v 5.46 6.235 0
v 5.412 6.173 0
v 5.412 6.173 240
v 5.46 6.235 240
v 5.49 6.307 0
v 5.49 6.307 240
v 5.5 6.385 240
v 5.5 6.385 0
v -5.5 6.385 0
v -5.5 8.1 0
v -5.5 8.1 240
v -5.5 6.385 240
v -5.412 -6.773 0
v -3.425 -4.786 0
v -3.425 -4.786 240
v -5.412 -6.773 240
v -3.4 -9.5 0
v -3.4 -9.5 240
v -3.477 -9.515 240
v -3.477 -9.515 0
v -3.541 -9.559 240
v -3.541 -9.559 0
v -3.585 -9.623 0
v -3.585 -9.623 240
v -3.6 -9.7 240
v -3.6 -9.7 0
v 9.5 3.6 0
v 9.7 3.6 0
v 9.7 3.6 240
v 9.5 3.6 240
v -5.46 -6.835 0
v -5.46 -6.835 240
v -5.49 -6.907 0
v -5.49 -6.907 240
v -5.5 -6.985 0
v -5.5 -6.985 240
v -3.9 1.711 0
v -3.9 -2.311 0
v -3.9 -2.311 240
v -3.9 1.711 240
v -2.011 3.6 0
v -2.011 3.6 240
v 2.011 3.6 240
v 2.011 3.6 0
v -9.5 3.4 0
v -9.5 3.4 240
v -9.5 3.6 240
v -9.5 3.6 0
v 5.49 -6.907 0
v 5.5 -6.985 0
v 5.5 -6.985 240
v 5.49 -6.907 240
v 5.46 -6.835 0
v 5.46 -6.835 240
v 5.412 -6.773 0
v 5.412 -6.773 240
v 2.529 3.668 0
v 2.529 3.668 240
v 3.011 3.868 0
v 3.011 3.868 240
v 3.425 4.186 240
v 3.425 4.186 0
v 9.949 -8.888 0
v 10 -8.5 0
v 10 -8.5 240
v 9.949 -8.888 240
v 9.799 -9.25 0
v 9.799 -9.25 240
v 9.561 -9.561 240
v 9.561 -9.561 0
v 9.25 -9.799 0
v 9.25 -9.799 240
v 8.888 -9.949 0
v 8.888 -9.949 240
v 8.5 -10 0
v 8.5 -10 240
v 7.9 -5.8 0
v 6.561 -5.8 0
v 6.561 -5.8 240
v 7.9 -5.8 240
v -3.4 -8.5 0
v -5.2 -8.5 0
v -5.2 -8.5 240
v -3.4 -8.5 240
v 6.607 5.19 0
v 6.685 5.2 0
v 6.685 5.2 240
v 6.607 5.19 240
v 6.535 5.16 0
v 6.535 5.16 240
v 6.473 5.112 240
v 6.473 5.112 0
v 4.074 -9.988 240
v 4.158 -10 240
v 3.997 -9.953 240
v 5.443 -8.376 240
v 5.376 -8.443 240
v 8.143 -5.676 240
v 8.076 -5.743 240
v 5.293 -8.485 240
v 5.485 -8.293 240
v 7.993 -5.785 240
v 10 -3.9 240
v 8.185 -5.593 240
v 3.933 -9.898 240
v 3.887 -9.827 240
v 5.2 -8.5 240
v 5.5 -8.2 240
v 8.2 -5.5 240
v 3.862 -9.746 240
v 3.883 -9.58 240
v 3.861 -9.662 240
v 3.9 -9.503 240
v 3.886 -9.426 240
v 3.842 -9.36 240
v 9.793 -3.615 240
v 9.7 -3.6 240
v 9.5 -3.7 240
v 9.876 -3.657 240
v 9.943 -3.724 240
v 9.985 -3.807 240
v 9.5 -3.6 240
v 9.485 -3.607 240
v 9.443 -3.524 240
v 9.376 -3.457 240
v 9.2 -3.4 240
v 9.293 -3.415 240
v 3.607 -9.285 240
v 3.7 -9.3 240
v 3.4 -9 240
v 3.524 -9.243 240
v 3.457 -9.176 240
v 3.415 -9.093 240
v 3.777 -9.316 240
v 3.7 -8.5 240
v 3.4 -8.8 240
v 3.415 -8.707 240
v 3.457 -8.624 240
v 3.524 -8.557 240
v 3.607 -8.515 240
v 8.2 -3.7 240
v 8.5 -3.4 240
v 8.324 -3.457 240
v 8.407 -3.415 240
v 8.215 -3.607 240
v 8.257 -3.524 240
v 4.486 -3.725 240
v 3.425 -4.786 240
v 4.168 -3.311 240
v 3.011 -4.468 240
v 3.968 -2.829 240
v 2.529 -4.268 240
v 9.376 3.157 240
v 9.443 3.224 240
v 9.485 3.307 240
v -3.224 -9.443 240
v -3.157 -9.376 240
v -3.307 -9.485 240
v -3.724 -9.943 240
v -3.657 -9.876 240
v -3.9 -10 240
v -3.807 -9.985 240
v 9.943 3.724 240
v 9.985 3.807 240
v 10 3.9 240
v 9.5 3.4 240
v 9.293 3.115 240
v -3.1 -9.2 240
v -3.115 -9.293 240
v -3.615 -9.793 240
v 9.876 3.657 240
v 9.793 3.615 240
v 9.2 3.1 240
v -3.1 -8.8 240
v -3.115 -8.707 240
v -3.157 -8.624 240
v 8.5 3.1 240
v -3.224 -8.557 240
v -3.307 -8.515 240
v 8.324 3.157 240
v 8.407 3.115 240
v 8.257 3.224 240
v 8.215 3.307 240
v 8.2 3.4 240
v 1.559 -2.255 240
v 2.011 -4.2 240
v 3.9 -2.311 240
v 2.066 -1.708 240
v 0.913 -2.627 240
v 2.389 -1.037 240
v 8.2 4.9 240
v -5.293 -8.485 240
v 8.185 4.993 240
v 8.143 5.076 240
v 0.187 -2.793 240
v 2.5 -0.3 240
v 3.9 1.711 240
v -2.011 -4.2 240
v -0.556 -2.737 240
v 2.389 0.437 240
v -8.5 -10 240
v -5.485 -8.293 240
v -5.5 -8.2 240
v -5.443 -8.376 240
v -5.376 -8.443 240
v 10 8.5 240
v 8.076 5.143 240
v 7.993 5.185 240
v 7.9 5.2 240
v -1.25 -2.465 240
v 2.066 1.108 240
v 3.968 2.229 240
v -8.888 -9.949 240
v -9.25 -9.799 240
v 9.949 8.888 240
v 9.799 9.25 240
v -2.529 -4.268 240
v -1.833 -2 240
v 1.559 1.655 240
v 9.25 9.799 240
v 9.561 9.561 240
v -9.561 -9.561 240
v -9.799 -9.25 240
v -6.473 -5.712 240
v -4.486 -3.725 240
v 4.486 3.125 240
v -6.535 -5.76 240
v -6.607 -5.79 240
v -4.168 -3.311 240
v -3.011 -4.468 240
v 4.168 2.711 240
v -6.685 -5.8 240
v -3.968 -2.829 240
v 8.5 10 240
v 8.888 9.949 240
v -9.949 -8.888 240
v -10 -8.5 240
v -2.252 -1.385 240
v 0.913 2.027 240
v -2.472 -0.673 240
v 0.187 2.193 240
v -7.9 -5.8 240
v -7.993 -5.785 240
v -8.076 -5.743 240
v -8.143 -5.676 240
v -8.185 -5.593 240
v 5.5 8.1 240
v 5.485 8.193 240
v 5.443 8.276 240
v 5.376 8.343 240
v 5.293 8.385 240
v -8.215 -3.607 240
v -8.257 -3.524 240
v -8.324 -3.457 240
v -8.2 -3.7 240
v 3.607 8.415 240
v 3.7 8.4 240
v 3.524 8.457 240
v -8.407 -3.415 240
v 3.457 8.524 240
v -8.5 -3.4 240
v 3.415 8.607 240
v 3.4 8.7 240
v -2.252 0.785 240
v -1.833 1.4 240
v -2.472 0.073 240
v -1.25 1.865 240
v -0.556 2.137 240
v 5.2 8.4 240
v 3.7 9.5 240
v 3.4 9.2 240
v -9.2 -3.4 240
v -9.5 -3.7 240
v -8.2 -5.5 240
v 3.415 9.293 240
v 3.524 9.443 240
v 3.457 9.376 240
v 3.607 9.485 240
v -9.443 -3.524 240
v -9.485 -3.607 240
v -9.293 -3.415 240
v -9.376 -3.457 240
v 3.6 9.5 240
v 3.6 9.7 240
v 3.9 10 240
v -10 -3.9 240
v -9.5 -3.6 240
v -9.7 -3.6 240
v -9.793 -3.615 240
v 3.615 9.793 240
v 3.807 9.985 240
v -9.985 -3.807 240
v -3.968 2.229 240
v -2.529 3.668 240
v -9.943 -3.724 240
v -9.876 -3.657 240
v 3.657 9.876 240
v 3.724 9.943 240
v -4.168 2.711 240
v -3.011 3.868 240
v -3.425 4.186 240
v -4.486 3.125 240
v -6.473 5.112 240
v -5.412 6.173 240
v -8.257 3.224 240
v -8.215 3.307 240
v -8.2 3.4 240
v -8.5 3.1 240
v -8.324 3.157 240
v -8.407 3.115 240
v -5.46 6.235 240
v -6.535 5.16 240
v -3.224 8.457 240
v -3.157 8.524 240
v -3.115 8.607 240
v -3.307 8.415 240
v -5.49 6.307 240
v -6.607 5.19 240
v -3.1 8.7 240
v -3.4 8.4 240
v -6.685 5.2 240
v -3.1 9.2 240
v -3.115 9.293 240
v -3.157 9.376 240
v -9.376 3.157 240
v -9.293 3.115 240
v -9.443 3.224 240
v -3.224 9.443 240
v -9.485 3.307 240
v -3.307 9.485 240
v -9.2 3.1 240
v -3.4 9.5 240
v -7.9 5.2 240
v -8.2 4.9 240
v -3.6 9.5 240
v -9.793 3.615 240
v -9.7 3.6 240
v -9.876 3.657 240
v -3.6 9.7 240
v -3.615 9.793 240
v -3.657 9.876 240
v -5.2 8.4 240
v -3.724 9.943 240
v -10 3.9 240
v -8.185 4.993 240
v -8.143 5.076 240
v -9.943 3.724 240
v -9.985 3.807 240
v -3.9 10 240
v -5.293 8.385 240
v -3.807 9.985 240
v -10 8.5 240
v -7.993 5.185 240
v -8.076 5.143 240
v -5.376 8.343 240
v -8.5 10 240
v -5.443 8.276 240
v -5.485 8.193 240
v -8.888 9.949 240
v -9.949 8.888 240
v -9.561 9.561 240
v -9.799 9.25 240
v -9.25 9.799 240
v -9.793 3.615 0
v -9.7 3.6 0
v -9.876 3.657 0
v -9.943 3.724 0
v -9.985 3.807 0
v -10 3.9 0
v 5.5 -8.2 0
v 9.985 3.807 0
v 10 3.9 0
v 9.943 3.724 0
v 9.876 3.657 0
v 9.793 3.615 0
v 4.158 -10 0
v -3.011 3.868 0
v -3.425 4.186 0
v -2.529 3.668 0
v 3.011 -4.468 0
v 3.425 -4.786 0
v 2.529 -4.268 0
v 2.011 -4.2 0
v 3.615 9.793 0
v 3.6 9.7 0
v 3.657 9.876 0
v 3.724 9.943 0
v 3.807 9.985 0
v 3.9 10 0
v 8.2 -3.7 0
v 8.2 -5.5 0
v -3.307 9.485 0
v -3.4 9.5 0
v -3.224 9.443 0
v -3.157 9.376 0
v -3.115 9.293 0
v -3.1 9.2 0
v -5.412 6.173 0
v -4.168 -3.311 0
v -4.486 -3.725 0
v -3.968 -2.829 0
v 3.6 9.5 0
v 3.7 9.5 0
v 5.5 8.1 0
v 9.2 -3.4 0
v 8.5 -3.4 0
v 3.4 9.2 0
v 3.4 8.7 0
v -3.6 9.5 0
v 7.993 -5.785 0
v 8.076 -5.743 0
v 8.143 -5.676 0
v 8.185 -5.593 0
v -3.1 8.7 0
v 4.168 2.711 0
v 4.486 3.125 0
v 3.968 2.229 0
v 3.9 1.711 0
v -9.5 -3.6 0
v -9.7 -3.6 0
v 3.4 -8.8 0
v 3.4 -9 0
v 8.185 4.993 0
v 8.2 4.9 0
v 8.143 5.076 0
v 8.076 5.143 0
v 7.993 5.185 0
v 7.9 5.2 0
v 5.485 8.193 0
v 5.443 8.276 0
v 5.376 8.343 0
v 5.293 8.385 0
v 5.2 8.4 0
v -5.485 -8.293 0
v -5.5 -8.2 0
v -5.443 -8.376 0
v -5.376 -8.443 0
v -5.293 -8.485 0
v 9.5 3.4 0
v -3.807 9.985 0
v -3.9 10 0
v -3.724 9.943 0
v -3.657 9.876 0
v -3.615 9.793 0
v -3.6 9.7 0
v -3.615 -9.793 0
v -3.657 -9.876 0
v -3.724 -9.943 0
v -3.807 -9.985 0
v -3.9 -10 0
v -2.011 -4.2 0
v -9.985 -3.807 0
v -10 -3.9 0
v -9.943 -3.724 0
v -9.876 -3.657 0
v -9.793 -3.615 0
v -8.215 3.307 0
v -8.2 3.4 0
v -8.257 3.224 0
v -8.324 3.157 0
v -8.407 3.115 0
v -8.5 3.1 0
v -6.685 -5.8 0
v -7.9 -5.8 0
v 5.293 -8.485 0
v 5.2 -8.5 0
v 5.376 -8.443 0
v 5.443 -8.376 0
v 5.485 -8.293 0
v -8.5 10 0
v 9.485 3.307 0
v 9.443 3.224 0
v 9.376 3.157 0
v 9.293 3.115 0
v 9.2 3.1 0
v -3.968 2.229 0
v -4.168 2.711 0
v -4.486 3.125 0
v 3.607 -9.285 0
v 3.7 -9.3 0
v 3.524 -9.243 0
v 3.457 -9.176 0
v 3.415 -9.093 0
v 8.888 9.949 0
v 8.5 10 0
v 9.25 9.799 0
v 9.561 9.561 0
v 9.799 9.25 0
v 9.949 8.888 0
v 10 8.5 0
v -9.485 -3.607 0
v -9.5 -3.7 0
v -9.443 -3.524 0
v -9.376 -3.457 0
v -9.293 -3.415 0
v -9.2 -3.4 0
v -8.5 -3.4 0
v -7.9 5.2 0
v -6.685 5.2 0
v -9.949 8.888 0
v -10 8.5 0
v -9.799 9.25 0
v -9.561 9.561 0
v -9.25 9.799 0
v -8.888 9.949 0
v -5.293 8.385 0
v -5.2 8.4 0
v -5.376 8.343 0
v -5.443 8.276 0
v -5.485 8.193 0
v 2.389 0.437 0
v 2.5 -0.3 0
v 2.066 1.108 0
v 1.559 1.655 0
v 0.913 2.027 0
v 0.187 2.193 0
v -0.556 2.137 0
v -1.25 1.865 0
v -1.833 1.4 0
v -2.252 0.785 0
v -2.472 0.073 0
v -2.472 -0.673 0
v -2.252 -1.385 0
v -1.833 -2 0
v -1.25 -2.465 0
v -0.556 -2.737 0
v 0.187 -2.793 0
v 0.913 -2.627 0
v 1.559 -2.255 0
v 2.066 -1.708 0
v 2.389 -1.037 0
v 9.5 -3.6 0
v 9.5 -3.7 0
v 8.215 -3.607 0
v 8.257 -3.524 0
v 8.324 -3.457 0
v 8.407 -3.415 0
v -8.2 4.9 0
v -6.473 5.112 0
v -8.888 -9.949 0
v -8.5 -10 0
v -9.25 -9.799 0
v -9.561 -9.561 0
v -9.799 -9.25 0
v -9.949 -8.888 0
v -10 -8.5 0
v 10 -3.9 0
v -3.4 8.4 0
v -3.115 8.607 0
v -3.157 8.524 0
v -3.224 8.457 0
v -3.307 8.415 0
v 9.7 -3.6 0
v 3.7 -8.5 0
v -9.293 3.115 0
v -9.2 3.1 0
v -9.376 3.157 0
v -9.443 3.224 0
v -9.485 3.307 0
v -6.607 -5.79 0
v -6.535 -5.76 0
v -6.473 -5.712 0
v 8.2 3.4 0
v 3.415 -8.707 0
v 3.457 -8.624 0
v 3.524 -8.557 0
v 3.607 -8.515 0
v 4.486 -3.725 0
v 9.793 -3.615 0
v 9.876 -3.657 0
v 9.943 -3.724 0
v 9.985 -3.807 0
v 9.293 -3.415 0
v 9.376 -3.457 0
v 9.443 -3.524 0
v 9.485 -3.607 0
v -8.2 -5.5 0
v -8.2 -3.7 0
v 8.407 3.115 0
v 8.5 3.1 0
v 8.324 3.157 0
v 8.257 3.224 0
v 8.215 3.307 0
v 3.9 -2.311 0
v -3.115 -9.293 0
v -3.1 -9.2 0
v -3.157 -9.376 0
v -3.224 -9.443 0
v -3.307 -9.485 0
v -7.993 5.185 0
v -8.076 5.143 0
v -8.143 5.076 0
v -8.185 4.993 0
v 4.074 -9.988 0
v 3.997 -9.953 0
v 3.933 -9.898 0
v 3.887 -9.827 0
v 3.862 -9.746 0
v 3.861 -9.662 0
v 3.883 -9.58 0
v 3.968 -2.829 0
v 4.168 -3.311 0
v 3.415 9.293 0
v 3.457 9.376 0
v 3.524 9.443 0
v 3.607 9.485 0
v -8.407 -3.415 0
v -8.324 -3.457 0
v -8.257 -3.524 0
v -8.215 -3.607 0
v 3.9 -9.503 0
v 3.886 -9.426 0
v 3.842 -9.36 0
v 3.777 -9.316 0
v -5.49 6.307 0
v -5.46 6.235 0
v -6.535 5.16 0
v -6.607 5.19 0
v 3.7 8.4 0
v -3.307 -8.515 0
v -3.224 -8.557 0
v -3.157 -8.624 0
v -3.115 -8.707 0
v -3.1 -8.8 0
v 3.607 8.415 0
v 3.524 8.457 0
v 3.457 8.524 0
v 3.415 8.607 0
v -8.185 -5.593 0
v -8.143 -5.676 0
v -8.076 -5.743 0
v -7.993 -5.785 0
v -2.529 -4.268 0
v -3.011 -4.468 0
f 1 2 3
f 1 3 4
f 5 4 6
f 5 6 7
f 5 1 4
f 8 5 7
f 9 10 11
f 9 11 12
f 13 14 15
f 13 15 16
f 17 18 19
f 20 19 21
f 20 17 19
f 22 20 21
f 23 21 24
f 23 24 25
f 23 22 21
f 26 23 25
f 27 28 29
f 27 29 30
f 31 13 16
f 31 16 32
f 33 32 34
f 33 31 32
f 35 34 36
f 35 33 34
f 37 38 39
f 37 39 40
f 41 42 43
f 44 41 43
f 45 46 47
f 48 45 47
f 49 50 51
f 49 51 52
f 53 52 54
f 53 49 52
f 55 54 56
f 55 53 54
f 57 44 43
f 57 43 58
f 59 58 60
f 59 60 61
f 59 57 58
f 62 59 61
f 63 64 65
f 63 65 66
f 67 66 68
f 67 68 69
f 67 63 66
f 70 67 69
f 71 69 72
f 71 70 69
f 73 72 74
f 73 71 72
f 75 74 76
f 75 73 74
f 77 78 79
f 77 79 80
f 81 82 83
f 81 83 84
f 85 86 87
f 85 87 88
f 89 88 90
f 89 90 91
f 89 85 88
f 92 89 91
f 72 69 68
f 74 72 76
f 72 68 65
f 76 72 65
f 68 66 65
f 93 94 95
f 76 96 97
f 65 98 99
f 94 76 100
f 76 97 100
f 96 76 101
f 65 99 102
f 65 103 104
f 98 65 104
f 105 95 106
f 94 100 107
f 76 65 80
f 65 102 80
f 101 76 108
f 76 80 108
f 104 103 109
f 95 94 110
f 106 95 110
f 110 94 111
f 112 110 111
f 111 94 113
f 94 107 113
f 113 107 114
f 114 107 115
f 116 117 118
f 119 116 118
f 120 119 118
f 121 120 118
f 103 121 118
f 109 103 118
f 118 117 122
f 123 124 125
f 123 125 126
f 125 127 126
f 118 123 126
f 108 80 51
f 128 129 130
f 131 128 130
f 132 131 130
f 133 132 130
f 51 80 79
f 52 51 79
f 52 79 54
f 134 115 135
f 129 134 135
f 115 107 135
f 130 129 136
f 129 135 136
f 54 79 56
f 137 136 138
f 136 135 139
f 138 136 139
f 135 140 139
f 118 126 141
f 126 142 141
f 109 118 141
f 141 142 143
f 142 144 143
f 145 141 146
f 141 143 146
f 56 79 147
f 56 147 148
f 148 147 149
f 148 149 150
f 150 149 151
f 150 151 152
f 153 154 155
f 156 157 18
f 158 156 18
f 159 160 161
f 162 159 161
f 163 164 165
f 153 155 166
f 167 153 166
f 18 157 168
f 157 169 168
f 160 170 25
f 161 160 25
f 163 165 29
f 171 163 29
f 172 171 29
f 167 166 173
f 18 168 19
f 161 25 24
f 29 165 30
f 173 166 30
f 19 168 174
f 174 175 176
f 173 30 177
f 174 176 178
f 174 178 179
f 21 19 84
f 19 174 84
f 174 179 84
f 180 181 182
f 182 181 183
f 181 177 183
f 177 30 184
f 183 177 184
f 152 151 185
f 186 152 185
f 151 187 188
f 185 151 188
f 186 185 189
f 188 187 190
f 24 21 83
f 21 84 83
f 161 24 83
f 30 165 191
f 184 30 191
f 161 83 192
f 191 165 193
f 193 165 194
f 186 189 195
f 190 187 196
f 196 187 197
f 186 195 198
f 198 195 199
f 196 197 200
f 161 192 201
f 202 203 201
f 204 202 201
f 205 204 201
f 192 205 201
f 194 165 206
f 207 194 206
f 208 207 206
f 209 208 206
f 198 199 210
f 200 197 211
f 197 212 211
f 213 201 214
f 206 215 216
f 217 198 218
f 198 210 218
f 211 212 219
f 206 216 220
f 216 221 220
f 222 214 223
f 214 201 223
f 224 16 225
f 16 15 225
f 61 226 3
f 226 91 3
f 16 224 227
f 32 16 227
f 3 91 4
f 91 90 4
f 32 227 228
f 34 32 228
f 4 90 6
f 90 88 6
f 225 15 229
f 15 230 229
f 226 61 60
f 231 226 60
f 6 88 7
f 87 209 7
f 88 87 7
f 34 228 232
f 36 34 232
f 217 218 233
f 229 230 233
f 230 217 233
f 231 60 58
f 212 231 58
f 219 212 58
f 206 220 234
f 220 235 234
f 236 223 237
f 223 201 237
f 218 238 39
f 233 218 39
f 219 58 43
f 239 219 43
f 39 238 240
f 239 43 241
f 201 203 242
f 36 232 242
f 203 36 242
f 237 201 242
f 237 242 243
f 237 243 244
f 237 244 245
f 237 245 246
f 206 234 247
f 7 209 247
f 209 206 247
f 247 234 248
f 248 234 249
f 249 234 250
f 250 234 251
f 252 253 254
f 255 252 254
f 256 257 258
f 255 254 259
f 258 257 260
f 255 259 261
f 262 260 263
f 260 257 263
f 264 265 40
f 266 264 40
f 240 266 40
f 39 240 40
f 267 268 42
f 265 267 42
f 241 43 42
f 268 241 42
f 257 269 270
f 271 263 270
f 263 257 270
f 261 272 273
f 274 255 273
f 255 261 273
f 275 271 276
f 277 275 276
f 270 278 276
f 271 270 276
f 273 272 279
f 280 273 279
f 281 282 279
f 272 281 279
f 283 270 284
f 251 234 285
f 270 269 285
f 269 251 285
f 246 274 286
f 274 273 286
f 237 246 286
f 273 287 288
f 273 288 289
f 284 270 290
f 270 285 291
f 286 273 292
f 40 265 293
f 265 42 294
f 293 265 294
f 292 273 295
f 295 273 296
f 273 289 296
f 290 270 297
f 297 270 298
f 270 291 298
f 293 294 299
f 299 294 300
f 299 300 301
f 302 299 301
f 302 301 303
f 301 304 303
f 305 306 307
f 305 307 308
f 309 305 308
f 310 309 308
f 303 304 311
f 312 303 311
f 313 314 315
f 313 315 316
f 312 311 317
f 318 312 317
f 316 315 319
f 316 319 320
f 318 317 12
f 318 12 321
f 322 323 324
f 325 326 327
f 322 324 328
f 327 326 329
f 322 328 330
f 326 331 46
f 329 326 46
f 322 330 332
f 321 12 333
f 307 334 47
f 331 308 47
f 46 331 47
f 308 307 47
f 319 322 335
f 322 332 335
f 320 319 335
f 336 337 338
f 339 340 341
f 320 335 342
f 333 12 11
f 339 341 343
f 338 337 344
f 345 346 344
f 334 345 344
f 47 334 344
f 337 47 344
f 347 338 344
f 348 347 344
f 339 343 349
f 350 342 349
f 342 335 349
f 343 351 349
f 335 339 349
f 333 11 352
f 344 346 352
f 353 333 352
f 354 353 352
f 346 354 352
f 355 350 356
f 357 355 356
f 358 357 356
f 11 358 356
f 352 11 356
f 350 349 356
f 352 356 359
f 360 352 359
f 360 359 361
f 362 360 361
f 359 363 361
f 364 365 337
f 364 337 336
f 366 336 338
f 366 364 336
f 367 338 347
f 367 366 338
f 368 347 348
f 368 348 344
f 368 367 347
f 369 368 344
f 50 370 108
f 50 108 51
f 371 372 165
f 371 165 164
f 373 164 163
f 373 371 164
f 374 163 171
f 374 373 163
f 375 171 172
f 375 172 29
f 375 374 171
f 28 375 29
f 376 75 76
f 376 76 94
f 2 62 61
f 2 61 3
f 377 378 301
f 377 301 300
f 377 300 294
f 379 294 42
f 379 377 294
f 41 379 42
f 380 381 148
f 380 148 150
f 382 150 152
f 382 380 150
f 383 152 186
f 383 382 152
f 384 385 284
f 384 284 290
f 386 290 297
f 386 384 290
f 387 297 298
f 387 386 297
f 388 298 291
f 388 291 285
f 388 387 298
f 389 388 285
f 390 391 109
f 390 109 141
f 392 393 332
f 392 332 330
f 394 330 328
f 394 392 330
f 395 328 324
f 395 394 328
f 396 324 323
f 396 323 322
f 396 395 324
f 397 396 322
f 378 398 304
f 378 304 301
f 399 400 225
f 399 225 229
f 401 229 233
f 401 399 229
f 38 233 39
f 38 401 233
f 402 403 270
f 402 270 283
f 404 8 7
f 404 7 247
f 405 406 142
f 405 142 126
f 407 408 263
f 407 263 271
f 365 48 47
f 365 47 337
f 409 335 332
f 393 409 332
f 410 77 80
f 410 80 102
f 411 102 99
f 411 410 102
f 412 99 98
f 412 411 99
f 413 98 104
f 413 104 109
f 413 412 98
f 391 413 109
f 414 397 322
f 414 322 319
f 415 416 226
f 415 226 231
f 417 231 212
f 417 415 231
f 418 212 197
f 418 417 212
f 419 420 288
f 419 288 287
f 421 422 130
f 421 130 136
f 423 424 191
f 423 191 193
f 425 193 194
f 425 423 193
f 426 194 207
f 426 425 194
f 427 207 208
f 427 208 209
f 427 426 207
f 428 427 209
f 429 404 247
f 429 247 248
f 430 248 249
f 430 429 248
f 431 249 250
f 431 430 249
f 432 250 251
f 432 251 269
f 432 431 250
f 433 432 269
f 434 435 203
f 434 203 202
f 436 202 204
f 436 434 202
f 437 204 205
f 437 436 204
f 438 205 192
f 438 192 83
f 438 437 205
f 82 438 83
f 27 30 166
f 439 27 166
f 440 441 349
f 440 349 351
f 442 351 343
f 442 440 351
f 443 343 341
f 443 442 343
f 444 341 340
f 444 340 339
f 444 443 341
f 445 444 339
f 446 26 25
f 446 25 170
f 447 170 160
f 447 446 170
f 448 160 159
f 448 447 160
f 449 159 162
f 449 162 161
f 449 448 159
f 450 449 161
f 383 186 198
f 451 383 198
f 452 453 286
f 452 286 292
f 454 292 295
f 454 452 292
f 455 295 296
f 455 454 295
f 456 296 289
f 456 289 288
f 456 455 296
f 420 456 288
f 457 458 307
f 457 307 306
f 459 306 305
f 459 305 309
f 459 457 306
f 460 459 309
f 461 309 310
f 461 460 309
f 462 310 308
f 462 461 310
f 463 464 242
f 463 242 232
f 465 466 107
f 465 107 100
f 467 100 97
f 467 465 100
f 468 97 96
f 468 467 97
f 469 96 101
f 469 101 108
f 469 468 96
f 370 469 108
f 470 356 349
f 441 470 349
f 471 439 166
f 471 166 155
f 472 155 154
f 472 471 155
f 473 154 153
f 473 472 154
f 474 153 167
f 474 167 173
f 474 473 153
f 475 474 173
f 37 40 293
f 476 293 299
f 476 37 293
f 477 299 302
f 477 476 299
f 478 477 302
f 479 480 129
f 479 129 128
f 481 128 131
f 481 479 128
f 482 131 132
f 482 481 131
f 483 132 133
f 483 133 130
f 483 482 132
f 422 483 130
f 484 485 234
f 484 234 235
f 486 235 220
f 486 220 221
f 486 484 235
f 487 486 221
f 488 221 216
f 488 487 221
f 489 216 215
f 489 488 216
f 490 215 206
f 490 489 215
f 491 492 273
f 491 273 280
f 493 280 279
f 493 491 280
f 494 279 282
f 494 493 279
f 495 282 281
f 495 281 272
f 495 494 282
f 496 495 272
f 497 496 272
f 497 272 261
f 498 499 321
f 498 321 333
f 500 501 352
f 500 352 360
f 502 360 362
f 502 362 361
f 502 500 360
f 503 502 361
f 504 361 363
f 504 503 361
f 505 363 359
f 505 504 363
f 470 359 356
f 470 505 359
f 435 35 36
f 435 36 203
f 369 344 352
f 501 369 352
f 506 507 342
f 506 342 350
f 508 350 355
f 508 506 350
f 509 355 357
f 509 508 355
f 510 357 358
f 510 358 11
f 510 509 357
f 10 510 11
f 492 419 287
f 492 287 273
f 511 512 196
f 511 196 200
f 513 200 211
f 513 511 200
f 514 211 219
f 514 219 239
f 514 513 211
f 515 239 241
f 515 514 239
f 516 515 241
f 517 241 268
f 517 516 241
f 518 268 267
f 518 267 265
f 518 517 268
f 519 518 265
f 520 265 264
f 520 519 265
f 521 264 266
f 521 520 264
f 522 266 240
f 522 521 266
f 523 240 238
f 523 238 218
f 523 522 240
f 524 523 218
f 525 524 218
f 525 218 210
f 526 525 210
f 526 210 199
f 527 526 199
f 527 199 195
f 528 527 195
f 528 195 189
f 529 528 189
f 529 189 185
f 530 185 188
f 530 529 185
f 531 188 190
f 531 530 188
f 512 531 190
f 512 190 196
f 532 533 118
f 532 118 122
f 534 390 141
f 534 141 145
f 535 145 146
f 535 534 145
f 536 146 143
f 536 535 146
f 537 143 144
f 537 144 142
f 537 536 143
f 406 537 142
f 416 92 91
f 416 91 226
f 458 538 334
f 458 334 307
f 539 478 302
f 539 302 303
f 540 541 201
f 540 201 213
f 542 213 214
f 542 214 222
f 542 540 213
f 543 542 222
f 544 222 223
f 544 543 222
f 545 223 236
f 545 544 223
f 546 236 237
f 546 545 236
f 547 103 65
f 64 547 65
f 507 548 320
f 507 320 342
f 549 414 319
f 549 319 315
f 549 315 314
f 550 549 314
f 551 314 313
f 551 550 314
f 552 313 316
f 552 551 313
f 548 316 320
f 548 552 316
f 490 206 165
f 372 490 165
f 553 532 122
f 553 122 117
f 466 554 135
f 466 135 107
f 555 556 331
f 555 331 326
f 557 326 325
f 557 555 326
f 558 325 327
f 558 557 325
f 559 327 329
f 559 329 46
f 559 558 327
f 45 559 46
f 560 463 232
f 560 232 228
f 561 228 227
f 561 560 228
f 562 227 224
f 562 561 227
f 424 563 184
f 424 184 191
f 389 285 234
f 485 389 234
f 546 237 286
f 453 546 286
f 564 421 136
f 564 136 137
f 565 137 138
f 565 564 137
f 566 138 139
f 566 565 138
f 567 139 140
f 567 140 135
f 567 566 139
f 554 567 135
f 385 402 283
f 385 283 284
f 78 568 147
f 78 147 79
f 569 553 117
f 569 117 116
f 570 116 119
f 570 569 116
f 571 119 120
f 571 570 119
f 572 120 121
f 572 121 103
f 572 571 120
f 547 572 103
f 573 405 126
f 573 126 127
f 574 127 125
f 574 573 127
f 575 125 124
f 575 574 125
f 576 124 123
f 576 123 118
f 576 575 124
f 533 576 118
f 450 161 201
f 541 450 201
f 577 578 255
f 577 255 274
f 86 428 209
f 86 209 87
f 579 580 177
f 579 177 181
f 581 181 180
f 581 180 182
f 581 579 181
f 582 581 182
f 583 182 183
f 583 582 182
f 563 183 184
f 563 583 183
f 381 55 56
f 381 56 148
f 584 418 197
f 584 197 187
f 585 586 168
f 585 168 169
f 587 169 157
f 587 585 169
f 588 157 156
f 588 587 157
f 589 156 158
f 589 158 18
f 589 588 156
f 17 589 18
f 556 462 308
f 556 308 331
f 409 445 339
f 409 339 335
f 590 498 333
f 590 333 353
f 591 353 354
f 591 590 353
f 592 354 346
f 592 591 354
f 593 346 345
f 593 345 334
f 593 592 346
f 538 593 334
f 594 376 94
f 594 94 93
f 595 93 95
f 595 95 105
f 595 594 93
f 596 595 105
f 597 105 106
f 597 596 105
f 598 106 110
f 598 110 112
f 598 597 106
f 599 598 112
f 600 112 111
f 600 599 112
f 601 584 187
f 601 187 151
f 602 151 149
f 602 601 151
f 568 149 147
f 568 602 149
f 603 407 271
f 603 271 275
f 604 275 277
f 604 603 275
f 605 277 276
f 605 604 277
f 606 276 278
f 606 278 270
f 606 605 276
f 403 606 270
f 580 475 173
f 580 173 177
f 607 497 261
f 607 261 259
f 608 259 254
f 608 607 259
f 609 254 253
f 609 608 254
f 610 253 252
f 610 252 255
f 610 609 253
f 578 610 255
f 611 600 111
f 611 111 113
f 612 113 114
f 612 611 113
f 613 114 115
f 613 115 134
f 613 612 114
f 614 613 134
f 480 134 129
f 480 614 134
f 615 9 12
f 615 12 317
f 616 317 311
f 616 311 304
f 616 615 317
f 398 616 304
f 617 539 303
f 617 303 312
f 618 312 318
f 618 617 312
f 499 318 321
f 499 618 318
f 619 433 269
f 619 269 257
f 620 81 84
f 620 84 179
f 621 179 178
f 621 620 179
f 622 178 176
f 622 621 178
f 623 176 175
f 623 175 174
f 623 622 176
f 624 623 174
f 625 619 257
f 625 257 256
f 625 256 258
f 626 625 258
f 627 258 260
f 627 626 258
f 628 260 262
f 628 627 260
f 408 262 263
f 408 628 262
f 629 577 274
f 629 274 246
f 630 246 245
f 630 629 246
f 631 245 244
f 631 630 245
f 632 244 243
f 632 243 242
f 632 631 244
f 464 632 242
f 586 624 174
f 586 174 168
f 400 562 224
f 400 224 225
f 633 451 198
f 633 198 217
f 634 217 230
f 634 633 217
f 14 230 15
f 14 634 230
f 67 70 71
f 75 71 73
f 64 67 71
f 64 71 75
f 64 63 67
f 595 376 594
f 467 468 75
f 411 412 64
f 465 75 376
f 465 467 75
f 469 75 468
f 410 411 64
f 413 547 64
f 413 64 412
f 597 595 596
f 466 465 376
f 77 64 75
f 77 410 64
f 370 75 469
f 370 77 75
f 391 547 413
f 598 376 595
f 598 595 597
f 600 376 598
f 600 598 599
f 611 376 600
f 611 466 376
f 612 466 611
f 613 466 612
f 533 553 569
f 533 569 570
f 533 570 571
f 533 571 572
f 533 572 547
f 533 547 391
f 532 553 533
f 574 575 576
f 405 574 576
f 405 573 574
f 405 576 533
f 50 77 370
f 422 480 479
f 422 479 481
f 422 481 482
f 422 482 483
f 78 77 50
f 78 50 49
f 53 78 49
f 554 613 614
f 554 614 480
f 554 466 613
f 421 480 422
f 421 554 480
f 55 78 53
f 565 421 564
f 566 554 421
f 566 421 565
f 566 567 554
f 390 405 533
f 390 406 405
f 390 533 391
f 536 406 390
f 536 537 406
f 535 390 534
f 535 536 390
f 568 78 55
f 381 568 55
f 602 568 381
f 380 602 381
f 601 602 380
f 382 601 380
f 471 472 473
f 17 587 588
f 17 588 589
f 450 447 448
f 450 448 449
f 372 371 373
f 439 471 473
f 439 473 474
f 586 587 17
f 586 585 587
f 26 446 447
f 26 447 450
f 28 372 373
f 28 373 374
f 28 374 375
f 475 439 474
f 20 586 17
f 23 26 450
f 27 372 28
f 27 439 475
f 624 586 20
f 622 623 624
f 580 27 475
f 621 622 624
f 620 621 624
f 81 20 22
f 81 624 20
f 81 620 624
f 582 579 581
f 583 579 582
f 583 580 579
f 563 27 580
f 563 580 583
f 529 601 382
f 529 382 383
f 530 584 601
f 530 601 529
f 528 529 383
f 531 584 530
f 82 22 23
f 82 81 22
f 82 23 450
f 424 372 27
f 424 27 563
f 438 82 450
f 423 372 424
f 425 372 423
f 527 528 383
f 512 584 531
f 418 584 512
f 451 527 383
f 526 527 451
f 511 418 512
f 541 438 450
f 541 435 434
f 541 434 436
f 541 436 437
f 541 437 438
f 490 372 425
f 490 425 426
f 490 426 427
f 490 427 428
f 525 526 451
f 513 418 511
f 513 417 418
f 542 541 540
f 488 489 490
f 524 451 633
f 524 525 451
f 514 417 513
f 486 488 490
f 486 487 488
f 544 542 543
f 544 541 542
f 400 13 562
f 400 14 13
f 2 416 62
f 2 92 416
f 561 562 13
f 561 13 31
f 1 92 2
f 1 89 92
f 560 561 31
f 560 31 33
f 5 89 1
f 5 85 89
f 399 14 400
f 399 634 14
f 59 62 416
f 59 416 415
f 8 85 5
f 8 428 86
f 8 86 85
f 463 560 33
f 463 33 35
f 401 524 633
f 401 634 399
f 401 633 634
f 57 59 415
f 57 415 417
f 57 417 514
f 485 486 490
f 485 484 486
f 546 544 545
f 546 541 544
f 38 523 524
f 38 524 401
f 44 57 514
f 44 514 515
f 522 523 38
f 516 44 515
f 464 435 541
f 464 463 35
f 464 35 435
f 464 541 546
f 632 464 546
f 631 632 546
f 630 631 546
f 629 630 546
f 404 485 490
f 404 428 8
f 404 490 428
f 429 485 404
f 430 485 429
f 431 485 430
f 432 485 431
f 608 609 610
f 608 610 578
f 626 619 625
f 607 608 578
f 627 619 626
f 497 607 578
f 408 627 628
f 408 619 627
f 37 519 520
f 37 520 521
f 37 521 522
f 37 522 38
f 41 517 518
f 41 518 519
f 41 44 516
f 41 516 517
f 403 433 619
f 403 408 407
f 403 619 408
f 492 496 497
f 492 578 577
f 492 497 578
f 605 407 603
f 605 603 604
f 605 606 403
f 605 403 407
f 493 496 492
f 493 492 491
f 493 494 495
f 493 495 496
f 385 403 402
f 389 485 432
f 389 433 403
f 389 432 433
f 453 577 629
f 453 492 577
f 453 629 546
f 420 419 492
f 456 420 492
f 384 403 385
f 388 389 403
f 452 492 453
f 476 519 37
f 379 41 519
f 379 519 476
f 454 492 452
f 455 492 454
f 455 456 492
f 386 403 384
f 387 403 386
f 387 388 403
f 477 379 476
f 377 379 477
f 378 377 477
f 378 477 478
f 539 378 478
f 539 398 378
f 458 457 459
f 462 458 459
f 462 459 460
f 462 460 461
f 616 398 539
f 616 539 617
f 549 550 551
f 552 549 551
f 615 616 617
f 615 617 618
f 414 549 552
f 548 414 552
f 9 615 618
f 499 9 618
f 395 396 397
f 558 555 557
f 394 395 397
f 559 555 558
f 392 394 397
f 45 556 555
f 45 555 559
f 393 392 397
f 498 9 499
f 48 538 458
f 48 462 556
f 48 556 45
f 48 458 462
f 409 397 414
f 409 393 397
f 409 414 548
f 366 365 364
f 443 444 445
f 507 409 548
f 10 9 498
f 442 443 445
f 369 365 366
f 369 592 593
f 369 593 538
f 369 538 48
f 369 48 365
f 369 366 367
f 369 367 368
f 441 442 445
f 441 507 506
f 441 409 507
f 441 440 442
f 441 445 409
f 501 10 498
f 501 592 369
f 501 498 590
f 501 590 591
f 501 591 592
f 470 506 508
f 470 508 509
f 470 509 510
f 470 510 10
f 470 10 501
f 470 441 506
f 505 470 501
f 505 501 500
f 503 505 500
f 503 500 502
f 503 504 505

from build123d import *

# Parameters (mm, degrees)
MODEL_R             = 2.5
BOSS_EXTRUDE1_DEPTH = 240


with BuildPart() as part:
    # Model → Boss-Extrude1 (new body)
    with BuildSketch(Plane.XY):
        with BuildLine():
            Line((3.9, -0.3), (3.9, -2.310912704))
            ThreePointArc((3.9, -2.310912704), (4.052240935, -3.076279568), (4.485786438, -3.725126266))
            Line((4.485786438, -3.725126266), (6.560660172, -5.8))
            Line((6.560660172, -5.8), (7.9, -5.8))
            ThreePointArc((7.9, -5.8), (8.112132034, -5.712132034), (8.2, -5.5))
            Line((8.2, -5.5), (8.2, -3.7))
            ThreePointArc((8.2, -3.7), (8.287867966, -3.487867966), (8.5, -3.4))
            Line((8.5, -3.4), (9.2, -3.4))
            ThreePointArc((9.2, -3.4), (9.412132034, -3.487867966), (9.5, -3.7))
            Line((9.5, -3.7), (9.5, -3.6))
            Line((9.5, -3.6), (9.7, -3.6))
            ThreePointArc((9.7, -3.6), (9.912132034, -3.687867966), (10, -3.9))
            Line((10, -3.9), (10, -8.5))
            ThreePointArc((10, -8.5), (9.560660172, -9.560660172), (8.5, -10))
            Line((8.5, -10), (4.15825757, -10))
            ThreePointArc((4.15825757, -10), (3.907259562, -9.864316767), (3.883303028, -9.58))
            ThreePointArc((3.883303028, -9.58), (3.867332005, -9.390455488), (3.7, -9.3))
            ThreePointArc((3.7, -9.3), (3.487867966, -9.212132034), (3.4, -9))
            Line((3.4, -9), (3.4, -8.8))
            ThreePointArc((3.4, -8.8), (3.487867966, -8.587867966), (3.7, -8.5))
            Line((3.7, -8.5), (5.2, -8.5))
            ThreePointArc((5.2, -8.5), (5.412132034, -8.412132034), (5.5, -8.2))
            Line((5.5, -8.2), (5.5, -6.98492424))
            ThreePointArc((5.5, -6.98492424), (5.47716386, -6.870119211), (5.412132034, -6.772792206))
            Line((5.412132034, -6.772792206), (3.425126266, -4.785786438))
            ThreePointArc((3.425126266, -4.785786438), (2.776279568, -4.352240935), (2.010912703, -4.2))
            Line((2.010912703, -4.2), (0, -4.2))
            Line((0, -4.2), (-2.010912703, -4.2))
            ThreePointArc((-2.010912703, -4.2), (-2.776279568, -4.352240935), (-3.425126266, -4.785786438))
            Line((-3.425126266, -4.785786438), (-5.412132034, -6.772792206))
            ThreePointArc((-5.412132034, -6.772792206), (-5.47716386, -6.870119211), (-5.5, -6.984924241))
            Line((-5.5, -6.984924241), (-5.5, -8.2))
            ThreePointArc((-5.5, -8.2), (-5.412132034, -8.412132034), (-5.2, -8.5))
            Line((-5.2, -8.5), (-3.4, -8.5))
            ThreePointArc((-3.4, -8.5), (-3.187867966, -8.587867966), (-3.1, -8.8))
            Line((-3.1, -8.8), (-3.1, -9.2))
            ThreePointArc((-3.1, -9.2), (-3.187867966, -9.412132034), (-3.4, -9.5))
            ThreePointArc((-3.4, -9.5), (-3.541421356, -9.558578644), (-3.6, -9.7))
            ThreePointArc((-3.6, -9.7), (-3.687867966, -9.912132034), (-3.9, -10))
            Line((-3.9, -10), (-8.5, -10))
            ThreePointArc((-8.5, -10), (-9.560660172, -9.560660172), (-10, -8.5))
            Line((-10, -8.5), (-10, -3.9))
            ThreePointArc((-10, -3.9), (-9.912132034, -3.687867966), (-9.7, -3.6))
            Line((-9.7, -3.6), (-9.5, -3.6))
            Line((-9.5, -3.6), (-9.5, -3.7))
            ThreePointArc((-9.5, -3.7), (-9.412132034, -3.487867966), (-9.2, -3.4))
            Line((-9.2, -3.4), (-8.5, -3.4))
            ThreePointArc((-8.5, -3.4), (-8.287867966, -3.487867966), (-8.2, -3.7))
            Line((-8.2, -3.7), (-8.2, -5.5))
            ThreePointArc((-8.2, -5.5), (-8.112132034, -5.712132034), (-7.9, -5.8))
            Line((-7.9, -5.8), (-6.68492424, -5.8))
            ThreePointArc((-6.68492424, -5.8), (-6.570119211, -5.77716386), (-6.472792206, -5.712132034))
            Line((-6.472792206, -5.712132034), (-4.485786438, -3.725126266))
            ThreePointArc((-4.485786438, -3.725126266), (-4.052240935, -3.076279568), (-3.9, -2.310912704))
            Line((-3.9, -2.310912704), (-3.9, -0.3))
            Line((-3.9, -0.3), (-3.9, 1.710912703))
            ThreePointArc((-3.9, 1.710912703), (-4.052240935, 2.476279568), (-4.485786438, 3.125126266))
            Line((-4.485786438, 3.125126266), (-6.472792206, 5.112132034))
            ThreePointArc((-6.472792206, 5.112132034), (-6.570119211, 5.17716386), (-6.68492424, 5.2))
            Line((-6.68492424, 5.2), (-7.9, 5.2))
            ThreePointArc((-7.9, 5.2), (-8.112132034, 5.112132034), (-8.2, 4.9))
            Line((-8.2, 4.9), (-8.2, 3.4))
            ThreePointArc((-8.2, 3.4), (-8.287867966, 3.187867966), (-8.5, 3.1))
            Line((-8.5, 3.1), (-9.2, 3.1))
            ThreePointArc((-9.2, 3.1), (-9.412132034, 3.187867966), (-9.5, 3.4))
            Line((-9.5, 3.4), (-9.5, 3.6))
            Line((-9.5, 3.6), (-9.7, 3.6))
            ThreePointArc((-9.7, 3.6), (-9.912132034, 3.687867966), (-10, 3.9))
            Line((-10, 3.9), (-10, 8.5))
            ThreePointArc((-10, 8.5), (-9.560660172, 9.560660172), (-8.5, 10))
            Line((-8.5, 10), (-3.9, 10))
            ThreePointArc((-3.9, 10), (-3.687867966, 9.912132034), (-3.6, 9.7))
            Line((-3.6, 9.7), (-3.6, 9.5))
            Line((-3.6, 9.5), (-3.4, 9.5))
            ThreePointArc((-3.4, 9.5), (-3.187867966, 9.412132034), (-3.1, 9.2))
            Line((-3.1, 9.2), (-3.1, 8.7))
            ThreePointArc((-3.1, 8.7), (-3.187867966, 8.487867965), (-3.4, 8.4))
            Line((-3.4, 8.4), (-5.2, 8.4))
            ThreePointArc((-5.2, 8.4), (-5.412132034, 8.312132034), (-5.5, 8.1))
            Line((-5.5, 8.1), (-5.5, 6.38492424))
            ThreePointArc((-5.5, 6.38492424), (-5.47716386, 6.270119211), (-5.412132034, 6.172792206))
            Line((-5.412132034, 6.172792206), (-3.425126266, 4.185786438))
            ThreePointArc((-3.425126266, 4.185786438), (-2.776279568, 3.752240935), (-2.010912703, 3.6))
            Line((-2.010912703, 3.6), (0, 3.6))
            Line((0, 3.6), (2.010912703, 3.6))
            ThreePointArc((2.010912703, 3.6), (2.776279568, 3.752240935), (3.425126266, 4.185786438))
            Line((3.425126266, 4.185786438), (5.412132034, 6.172792206))
            ThreePointArc((5.412132034, 6.172792206), (5.47716386, 6.270119211), (5.5, 6.38492424))
            Line((5.5, 6.38492424), (5.5, 8.1))
            ThreePointArc((5.5, 8.1), (5.412132034, 8.312132034), (5.2, 8.4))
            Line((5.2, 8.4), (3.7, 8.4))
            ThreePointArc((3.7, 8.4), (3.487867966, 8.487867965), (3.4, 8.7))
            Line((3.4, 8.7), (3.4, 9.2))
            ThreePointArc((3.4, 9.2), (3.487867966, 9.412132034), (3.7, 9.5))
            Line((3.7, 9.5), (3.6, 9.5))
            Line((3.6, 9.5), (3.6, 9.7))
            ThreePointArc((3.6, 9.7), (3.687867966, 9.912132034), (3.9, 10))
            Line((3.9, 10), (8.5, 10))
            ThreePointArc((8.5, 10), (9.560660172, 9.560660172), (10, 8.5))
            Line((10, 8.5), (10, 3.9))
            ThreePointArc((10, 3.9), (9.912132034, 3.687867966), (9.7, 3.6))
            Line((9.7, 3.6), (9.5, 3.6))
            Line((9.5, 3.6), (9.5, 3.4))
            ThreePointArc((9.5, 3.4), (9.412132034, 3.187867966), (9.2, 3.1))
            Line((9.2, 3.1), (8.5, 3.1))
            ThreePointArc((8.5, 3.1), (8.287867966, 3.187867966), (8.2, 3.4))
            Line((8.2, 3.4), (8.2, 4.9))
            ThreePointArc((8.2, 4.9), (8.112132034, 5.112132034), (7.9, 5.2))
            Line((7.9, 5.2), (6.684924241, 5.2))
            ThreePointArc((6.684924241, 5.2), (6.570119211, 5.17716386), (6.472792206, 5.112132034))
            Line((6.472792206, 5.112132034), (4.485786438, 3.125126266))
            ThreePointArc((4.485786438, 3.125126266), (4.052240935, 2.476279568), (3.9, 1.710912703))
            Line((3.9, 1.710912703), (3.9, -0.3))
        make_face()
        with Locations((0, -0.3)):
            Circle(MODEL_R, mode=Mode.SUBTRACT)
    extrude(amount=BOSS_EXTRUDE1_DEPTH)


solid = part.part
